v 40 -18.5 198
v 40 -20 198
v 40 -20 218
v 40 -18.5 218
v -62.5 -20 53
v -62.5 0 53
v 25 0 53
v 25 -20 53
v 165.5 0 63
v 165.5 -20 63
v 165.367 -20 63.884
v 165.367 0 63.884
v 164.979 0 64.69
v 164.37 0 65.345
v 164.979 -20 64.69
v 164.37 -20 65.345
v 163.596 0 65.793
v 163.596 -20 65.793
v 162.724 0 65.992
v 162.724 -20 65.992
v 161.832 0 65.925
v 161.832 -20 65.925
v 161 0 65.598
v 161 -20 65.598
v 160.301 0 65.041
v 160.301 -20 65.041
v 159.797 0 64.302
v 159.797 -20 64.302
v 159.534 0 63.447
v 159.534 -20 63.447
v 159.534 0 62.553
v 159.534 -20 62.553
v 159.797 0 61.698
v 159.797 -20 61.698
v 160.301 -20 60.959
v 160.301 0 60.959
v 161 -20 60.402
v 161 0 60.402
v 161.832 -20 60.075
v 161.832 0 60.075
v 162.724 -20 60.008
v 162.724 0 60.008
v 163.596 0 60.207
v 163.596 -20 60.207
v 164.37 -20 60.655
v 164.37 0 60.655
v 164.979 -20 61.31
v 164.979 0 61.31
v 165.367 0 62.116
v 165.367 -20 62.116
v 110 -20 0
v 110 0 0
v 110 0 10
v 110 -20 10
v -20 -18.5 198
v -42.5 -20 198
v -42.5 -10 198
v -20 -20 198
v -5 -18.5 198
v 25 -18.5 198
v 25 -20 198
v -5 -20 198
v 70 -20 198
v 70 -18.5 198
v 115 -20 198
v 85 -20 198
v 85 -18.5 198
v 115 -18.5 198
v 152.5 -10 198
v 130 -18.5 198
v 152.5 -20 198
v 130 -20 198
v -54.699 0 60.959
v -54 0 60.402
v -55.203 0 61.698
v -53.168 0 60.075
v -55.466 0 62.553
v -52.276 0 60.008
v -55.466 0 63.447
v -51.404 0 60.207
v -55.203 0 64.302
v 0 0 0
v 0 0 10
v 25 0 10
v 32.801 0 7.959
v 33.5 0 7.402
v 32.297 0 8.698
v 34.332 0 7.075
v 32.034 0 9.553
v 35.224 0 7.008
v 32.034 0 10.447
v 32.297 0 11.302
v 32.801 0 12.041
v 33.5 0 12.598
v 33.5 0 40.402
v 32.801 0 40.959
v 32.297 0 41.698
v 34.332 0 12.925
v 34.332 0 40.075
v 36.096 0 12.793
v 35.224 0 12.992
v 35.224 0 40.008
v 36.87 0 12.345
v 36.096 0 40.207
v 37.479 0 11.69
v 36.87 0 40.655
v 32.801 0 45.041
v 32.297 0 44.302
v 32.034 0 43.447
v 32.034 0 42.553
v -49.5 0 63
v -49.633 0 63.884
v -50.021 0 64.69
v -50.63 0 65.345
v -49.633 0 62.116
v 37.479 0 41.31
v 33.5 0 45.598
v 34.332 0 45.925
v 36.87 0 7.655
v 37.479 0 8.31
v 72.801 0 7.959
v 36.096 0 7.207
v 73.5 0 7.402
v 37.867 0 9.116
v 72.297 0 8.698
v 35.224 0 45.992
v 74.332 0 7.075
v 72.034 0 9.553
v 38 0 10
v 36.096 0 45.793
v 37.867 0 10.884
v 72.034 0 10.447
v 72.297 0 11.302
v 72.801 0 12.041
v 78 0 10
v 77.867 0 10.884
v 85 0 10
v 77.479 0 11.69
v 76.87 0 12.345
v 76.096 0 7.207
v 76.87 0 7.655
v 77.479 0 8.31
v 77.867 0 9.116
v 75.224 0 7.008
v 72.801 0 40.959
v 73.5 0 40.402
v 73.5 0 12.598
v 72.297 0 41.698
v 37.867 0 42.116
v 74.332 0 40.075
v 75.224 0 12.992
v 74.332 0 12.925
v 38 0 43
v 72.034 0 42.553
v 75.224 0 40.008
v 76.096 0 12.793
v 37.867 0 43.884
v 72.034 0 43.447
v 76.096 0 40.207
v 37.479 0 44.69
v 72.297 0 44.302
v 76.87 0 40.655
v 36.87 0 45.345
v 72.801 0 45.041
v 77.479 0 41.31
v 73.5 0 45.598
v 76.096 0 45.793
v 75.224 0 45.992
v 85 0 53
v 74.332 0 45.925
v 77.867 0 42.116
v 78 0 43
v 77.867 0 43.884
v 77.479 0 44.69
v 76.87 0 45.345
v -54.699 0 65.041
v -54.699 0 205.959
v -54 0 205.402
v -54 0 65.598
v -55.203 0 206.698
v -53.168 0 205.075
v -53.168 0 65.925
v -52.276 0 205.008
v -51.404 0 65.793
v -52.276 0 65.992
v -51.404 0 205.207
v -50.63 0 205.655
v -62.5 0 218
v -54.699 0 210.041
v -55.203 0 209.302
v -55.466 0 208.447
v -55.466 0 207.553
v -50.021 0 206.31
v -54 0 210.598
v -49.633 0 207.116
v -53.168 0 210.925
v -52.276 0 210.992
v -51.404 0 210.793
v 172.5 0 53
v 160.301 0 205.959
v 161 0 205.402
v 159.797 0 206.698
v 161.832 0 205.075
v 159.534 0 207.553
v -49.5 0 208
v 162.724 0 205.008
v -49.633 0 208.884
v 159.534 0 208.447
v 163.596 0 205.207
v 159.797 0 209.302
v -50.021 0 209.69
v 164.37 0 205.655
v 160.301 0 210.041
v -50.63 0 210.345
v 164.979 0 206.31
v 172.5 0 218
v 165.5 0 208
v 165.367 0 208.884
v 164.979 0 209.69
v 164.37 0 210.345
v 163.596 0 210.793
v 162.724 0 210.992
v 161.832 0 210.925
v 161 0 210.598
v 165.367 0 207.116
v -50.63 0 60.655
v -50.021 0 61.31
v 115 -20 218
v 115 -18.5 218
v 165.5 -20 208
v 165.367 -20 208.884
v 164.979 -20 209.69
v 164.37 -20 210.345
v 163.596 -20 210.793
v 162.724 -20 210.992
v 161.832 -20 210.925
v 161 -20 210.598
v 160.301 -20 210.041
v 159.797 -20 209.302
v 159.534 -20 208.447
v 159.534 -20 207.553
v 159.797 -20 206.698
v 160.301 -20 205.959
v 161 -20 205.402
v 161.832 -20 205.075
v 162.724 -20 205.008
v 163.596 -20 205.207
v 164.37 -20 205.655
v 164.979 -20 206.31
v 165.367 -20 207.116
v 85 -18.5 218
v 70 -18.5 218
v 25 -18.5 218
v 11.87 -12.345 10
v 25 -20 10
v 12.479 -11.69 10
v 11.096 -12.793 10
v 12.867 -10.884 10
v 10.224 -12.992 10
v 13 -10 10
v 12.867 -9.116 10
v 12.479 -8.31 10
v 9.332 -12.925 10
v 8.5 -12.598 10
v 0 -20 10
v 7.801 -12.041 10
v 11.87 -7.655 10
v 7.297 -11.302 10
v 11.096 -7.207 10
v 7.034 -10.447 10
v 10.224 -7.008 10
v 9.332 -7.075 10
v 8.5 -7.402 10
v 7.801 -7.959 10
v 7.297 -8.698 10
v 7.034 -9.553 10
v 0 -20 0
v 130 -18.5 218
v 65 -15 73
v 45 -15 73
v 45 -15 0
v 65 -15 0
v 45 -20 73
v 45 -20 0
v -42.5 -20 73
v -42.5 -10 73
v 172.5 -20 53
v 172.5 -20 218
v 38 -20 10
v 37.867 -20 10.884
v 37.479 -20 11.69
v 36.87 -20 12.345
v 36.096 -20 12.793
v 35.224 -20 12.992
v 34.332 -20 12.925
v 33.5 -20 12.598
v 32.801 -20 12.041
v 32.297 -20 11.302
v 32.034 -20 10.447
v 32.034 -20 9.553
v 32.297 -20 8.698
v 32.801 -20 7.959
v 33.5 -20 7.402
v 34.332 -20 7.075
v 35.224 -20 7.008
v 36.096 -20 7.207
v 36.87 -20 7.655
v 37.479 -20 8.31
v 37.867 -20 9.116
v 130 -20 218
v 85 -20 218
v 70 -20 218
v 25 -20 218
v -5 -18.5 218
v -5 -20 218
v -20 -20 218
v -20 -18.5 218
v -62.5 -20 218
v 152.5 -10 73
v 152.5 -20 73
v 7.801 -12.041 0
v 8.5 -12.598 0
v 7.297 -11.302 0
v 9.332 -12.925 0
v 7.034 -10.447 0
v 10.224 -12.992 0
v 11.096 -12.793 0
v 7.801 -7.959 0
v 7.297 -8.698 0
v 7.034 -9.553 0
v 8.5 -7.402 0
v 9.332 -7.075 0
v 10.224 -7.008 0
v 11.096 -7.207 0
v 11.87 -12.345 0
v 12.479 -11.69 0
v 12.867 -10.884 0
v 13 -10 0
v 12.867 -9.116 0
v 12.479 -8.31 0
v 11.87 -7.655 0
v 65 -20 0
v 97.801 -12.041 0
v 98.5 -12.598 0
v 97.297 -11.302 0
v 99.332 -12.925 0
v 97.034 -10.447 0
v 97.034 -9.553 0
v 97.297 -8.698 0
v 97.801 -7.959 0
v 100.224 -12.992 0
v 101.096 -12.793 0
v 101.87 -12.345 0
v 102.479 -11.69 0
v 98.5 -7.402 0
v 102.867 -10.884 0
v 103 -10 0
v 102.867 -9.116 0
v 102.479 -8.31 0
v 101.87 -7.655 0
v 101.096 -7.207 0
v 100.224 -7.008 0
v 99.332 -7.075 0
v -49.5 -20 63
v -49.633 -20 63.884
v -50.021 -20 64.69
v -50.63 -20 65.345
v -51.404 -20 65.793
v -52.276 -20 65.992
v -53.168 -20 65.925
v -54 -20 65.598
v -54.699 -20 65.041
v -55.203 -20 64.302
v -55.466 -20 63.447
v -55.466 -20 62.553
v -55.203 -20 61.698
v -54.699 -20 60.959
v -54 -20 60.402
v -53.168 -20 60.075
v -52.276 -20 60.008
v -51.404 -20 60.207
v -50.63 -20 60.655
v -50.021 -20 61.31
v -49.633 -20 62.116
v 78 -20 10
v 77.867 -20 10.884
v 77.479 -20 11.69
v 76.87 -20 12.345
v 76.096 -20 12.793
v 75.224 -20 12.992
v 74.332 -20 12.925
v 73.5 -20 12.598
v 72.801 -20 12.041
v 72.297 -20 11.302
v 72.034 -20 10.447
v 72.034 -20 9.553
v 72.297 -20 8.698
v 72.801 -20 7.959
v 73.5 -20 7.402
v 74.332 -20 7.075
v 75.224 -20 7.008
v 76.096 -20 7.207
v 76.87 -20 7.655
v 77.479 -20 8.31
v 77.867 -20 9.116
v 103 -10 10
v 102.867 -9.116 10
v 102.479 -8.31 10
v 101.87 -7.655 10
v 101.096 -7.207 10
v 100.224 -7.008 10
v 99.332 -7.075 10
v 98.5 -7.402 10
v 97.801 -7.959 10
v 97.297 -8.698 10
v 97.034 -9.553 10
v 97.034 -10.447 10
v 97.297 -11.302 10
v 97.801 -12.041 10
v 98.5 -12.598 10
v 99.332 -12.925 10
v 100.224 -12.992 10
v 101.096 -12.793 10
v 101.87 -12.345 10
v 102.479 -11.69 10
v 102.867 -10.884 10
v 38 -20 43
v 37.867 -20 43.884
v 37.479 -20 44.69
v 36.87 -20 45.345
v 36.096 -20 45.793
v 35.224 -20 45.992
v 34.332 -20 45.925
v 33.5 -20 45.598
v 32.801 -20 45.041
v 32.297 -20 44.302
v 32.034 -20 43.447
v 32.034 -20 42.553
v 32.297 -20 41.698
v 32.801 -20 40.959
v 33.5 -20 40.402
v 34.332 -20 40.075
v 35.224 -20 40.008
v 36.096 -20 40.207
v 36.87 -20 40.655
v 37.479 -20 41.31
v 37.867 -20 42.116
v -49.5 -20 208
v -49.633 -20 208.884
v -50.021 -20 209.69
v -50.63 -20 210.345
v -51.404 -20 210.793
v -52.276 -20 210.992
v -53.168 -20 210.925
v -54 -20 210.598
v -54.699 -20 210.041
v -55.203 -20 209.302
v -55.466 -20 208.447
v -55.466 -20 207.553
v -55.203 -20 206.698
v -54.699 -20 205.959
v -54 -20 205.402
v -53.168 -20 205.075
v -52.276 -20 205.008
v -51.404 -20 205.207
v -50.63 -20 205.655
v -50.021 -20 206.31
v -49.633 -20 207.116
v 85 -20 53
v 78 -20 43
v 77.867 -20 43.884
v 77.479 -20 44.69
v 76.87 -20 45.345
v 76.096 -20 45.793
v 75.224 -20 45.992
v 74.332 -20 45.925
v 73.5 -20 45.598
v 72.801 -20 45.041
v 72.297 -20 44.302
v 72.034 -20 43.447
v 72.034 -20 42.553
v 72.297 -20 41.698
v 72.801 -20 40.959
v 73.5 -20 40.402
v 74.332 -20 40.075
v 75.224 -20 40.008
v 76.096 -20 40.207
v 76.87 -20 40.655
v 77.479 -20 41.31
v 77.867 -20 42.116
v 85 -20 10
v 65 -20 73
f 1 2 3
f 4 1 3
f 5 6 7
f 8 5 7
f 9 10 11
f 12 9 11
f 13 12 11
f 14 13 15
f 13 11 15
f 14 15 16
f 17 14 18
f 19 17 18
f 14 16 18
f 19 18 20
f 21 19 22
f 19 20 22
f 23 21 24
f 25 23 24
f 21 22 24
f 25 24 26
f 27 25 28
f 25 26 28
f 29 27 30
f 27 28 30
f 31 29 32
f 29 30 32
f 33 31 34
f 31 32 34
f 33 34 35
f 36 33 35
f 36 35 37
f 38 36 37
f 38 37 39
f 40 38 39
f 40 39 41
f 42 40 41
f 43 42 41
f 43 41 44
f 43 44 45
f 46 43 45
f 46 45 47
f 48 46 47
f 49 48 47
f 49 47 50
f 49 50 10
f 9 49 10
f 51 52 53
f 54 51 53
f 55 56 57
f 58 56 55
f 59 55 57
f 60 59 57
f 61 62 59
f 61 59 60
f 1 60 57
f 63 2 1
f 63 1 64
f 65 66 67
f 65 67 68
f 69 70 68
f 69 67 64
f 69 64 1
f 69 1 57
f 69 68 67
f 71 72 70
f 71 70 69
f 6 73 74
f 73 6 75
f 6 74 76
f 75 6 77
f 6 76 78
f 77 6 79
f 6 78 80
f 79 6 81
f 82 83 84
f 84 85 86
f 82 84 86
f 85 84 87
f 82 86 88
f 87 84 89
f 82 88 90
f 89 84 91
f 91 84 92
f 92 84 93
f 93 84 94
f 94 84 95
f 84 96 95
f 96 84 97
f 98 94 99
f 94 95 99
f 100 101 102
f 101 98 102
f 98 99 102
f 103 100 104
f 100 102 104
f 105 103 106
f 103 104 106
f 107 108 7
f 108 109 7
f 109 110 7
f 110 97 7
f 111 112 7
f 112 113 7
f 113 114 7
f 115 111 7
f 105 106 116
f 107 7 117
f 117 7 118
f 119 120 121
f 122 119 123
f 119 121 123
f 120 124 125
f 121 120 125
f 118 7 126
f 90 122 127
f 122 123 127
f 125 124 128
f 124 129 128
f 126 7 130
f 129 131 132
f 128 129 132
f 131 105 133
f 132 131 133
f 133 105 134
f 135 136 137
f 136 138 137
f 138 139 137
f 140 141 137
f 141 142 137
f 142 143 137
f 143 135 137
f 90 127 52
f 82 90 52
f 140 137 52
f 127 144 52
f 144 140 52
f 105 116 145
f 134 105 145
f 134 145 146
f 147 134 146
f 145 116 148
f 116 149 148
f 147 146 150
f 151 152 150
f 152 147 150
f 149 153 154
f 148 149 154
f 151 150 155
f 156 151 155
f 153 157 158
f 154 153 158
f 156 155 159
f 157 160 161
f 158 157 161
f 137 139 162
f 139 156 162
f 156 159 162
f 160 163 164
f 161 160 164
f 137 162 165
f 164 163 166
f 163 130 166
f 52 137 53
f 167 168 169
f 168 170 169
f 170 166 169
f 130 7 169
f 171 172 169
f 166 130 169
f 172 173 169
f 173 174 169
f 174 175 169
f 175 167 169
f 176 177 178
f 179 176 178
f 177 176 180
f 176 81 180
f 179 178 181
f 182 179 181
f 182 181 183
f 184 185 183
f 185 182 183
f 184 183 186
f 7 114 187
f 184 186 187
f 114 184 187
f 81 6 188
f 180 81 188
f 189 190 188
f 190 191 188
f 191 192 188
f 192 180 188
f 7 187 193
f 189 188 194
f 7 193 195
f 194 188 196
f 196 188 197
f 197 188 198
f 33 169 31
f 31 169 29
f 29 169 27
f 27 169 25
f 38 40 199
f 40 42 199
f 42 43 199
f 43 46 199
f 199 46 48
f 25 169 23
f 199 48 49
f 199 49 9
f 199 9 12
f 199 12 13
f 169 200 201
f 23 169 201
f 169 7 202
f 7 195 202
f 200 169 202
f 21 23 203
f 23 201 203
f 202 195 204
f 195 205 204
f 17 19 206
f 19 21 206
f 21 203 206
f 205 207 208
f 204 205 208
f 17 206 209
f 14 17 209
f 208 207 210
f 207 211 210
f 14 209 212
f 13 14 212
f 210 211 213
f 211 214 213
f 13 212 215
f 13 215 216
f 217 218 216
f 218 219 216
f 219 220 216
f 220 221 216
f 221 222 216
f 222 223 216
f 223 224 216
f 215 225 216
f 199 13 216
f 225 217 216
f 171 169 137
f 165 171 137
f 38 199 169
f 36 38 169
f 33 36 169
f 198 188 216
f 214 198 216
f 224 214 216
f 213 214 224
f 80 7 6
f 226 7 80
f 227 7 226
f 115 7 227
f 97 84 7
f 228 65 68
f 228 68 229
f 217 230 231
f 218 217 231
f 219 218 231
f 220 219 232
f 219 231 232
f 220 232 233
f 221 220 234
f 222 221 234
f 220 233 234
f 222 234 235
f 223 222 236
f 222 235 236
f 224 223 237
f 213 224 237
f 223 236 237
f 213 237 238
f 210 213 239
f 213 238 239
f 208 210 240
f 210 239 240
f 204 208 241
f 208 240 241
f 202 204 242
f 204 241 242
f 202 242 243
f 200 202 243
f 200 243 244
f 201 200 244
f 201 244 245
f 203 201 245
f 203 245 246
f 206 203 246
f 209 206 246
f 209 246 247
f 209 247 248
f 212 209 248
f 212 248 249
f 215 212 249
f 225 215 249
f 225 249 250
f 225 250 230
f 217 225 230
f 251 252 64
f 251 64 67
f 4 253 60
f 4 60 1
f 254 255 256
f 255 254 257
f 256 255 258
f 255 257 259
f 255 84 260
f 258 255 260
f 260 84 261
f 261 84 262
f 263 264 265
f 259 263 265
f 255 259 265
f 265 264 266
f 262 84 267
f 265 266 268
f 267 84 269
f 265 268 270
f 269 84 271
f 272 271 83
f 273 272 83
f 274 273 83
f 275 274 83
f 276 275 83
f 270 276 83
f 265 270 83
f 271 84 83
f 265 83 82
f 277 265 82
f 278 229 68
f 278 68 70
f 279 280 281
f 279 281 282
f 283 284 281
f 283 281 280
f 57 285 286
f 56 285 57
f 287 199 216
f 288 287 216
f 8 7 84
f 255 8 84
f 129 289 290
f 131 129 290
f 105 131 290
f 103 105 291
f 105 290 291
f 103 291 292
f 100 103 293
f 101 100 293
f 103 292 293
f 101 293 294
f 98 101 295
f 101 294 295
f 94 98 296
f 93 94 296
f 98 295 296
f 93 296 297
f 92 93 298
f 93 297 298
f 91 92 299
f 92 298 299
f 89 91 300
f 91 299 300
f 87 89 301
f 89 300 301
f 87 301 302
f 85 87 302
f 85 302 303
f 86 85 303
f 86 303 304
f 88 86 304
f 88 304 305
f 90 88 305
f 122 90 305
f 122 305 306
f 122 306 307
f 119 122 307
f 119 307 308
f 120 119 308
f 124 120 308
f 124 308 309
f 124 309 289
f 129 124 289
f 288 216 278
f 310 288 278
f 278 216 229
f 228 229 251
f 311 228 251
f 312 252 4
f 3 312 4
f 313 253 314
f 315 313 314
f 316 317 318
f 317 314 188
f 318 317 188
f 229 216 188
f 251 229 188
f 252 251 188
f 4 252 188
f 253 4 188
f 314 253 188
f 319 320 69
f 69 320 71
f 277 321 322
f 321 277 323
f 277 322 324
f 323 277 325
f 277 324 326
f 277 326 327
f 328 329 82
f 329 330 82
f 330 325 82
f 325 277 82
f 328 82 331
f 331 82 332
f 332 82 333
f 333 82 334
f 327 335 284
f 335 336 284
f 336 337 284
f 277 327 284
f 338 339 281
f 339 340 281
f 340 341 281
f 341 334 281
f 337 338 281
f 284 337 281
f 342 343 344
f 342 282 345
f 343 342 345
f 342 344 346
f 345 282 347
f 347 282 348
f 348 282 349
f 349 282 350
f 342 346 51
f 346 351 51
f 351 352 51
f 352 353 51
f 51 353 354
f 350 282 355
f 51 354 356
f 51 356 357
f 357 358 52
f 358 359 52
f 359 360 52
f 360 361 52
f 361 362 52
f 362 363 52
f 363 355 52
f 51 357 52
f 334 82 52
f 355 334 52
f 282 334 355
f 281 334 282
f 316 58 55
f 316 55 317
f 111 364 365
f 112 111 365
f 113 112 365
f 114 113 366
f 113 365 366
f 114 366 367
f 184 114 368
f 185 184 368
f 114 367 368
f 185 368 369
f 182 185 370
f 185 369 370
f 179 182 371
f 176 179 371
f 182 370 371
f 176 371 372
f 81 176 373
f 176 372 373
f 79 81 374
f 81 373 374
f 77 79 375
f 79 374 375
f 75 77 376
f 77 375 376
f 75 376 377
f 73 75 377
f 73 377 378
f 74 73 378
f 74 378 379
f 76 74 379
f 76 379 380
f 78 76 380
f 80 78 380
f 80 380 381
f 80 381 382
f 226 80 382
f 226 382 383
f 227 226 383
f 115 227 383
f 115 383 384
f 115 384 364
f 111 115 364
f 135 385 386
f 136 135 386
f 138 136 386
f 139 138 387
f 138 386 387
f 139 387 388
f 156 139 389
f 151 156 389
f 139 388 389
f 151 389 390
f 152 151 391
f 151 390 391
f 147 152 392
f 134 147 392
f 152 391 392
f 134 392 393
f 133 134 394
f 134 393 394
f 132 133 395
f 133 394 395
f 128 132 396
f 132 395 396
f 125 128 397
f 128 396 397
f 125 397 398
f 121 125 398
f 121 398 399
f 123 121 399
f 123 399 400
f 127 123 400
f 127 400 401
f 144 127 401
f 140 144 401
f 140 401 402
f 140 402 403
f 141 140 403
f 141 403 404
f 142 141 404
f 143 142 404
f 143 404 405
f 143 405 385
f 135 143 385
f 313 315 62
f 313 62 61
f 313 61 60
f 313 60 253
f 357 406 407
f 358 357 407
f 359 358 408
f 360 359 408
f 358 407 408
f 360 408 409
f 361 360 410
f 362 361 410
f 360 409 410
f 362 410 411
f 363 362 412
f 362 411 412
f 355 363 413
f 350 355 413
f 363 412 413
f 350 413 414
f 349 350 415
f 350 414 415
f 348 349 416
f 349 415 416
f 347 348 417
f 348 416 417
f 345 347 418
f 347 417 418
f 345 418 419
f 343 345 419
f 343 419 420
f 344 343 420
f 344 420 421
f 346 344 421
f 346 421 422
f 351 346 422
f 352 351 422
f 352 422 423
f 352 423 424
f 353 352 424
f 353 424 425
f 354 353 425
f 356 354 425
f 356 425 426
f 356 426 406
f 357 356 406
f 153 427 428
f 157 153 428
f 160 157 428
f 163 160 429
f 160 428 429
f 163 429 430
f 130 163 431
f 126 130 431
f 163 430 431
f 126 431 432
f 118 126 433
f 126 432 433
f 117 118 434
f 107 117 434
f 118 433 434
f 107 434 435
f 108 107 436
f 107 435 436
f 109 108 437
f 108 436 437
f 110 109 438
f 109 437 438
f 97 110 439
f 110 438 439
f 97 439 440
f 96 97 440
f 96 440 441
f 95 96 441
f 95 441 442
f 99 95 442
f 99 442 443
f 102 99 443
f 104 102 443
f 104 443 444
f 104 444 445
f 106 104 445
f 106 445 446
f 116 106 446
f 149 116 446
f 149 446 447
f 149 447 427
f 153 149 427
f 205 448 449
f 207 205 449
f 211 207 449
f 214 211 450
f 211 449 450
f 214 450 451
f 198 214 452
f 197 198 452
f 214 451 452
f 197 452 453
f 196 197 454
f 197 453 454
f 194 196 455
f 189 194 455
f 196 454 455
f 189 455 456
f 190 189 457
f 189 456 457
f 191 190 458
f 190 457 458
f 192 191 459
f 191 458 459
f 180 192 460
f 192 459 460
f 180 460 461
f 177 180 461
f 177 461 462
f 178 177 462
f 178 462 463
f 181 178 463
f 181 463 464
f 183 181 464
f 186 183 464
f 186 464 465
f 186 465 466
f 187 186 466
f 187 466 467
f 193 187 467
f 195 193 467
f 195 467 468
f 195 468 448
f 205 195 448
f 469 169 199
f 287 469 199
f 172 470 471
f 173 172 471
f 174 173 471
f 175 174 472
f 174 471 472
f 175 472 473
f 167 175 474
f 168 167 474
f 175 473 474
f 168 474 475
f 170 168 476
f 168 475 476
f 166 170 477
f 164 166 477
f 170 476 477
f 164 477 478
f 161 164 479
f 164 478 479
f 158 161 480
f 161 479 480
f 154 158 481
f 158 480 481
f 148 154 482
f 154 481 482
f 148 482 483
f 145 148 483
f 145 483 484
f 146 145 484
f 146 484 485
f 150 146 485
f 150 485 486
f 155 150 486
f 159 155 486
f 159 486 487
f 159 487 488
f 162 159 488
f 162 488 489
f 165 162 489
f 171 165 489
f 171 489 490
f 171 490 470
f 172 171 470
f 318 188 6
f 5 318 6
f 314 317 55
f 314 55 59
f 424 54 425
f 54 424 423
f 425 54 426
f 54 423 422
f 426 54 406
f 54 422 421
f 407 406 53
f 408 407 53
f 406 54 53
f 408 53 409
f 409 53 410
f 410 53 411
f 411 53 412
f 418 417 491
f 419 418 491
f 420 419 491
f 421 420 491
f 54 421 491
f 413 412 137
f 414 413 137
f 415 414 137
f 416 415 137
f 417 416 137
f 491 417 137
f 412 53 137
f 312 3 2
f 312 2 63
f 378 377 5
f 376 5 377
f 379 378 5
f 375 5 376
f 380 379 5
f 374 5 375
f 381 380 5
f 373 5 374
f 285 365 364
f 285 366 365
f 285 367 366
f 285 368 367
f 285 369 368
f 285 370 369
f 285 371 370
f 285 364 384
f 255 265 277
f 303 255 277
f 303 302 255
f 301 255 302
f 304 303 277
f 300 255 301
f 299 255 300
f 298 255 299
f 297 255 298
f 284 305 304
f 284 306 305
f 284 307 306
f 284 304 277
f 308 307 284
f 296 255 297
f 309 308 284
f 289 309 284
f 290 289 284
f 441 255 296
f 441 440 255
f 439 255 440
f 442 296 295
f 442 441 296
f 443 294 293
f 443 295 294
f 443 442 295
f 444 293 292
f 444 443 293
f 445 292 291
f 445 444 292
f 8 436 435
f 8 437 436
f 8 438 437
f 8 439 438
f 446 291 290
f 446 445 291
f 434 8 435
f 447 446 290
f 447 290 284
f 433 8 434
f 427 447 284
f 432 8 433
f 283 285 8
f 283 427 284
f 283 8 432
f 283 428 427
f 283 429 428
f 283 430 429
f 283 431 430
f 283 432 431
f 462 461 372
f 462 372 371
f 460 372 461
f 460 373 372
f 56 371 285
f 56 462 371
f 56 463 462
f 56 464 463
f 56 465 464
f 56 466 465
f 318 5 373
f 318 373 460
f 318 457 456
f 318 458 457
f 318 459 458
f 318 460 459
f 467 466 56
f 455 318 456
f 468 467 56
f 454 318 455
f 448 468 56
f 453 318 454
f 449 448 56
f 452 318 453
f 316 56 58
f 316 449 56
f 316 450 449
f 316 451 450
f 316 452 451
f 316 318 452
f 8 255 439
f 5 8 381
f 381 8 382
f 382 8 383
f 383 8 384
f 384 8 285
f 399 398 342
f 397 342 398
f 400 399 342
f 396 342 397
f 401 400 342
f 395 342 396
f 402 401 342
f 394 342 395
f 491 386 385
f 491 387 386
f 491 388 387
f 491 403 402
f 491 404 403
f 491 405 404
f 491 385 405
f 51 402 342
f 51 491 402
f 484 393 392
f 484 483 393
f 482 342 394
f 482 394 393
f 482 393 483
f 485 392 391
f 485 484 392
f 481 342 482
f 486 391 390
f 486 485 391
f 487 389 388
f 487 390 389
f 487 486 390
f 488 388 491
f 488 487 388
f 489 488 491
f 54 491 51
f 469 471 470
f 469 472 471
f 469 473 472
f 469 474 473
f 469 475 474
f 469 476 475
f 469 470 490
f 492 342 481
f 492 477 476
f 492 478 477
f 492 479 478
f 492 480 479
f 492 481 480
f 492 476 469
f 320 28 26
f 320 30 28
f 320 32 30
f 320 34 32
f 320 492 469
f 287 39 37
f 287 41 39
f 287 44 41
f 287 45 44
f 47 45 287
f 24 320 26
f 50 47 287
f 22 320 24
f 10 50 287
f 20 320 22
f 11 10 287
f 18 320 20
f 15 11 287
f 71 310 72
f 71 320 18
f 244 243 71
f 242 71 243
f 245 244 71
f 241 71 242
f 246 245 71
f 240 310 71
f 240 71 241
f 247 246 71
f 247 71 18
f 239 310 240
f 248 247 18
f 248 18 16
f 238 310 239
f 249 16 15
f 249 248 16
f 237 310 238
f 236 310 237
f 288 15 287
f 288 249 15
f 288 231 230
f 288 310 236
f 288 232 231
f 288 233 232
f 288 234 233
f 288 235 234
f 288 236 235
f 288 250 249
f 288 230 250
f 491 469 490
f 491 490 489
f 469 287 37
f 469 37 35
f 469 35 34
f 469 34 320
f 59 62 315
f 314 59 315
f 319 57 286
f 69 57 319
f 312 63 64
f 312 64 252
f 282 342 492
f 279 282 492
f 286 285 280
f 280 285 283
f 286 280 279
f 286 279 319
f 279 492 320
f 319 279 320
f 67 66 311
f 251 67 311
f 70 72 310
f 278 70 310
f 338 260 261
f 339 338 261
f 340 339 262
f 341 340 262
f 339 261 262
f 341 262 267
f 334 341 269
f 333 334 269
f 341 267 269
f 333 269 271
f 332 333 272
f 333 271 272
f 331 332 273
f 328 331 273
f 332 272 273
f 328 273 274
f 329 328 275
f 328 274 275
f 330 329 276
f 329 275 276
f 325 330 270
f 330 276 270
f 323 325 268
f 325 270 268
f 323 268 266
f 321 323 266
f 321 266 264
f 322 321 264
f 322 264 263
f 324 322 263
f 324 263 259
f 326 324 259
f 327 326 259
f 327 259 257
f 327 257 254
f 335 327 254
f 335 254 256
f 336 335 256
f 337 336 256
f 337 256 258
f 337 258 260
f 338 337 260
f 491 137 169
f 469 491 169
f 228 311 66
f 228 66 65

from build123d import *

# Parameters (mm, degrees)
F1_DEPTH  = 20
F3_W      = 195
F3_H      = 125
F4_DEPTH  = 10
F5_W      = 20
F5_H      = 73
F6_DEPTH  = 5
F7_R      = 3
F8_DEPTH  = 20.001
F9_R      = 3
F10_DEPTH = 10.001
F12_W     = 15
F12_H     = 20
F13_DEPTH = 1.5


with BuildPart() as f1:
    # F0 (on Front) → F1 (new body)
    with BuildSketch(Plane.XZ):
        Polygon((0, 10), (0, 0), (110, 0), (110, 10), (85, 10), (85, 53), (172.5, 53), (172.5, 218), (-62.5, 218), (-62.5, 53), (25, 53), (25, 10), align=None)
    extrude(amount=F1_DEPTH)

    # F3 (on face) → F4 (cut)
    with BuildSketch(Plane.XZ.offset(20)):
        with Locations((55, 135.5)):
            Rectangle(F3_W, F3_H)
    extrude(amount=-F4_DEPTH, mode=Mode.SUBTRACT)

    # F5 (on face) → F6 (cut)
    with BuildSketch(Plane.XZ.offset(20)):
        with Locations((55, 36.5)):
            Rectangle(F5_W, F5_H)
    extrude(amount=-F6_DEPTH, mode=Mode.SUBTRACT)

    # F7 (on face) → F8 (cut, through all)
    with BuildSketch(Plane.XZ.offset(20)):
        with Locations((-52.5, 208)):
            Circle(F7_R)
        with Locations((162.5, 208)):
            Circle(F7_R)
        with Locations((162.5, 63)):
            Circle(F7_R)
        with Locations((-52.5, 63)):
            Circle(F7_R)
        with Locations((35, 10)):
            Circle(F7_R)
        with Locations((35, 43)):
            Circle(F7_R)
        with Locations((75, 43)):
            Circle(F7_R)
        with Locations((75, 10)):
            Circle(F7_R)
    extrude(amount=-F8_DEPTH, mode=Mode.SUBTRACT)

    # F9 (on face) → F10 (cut, through all)
    with BuildSketch(Plane.XY.offset(10)):
        with Locations((10, -10)):
            Circle(F9_R)
        with Locations((100, -10)):
            Circle(F9_R)
    extrude(amount=-F10_DEPTH, mode=Mode.SUBTRACT)

    # F12 (on face) → F13 (cut)
    with BuildSketch(Plane.XZ.offset(20)):
        with Locations((-12.5, 208)):
            Rectangle(F12_W, F12_H)
        with Locations((32.5, 208)):
            Rectangle(F12_W, F12_H)
        with Locations((77.5, 208)):
            Rectangle(F12_W, F12_H)
        with Locations((122.5, 208)):
            Rectangle(F12_W, F12_H)
    extrude(amount=-F13_DEPTH, mode=Mode.SUBTRACT)


solid = f1.part
